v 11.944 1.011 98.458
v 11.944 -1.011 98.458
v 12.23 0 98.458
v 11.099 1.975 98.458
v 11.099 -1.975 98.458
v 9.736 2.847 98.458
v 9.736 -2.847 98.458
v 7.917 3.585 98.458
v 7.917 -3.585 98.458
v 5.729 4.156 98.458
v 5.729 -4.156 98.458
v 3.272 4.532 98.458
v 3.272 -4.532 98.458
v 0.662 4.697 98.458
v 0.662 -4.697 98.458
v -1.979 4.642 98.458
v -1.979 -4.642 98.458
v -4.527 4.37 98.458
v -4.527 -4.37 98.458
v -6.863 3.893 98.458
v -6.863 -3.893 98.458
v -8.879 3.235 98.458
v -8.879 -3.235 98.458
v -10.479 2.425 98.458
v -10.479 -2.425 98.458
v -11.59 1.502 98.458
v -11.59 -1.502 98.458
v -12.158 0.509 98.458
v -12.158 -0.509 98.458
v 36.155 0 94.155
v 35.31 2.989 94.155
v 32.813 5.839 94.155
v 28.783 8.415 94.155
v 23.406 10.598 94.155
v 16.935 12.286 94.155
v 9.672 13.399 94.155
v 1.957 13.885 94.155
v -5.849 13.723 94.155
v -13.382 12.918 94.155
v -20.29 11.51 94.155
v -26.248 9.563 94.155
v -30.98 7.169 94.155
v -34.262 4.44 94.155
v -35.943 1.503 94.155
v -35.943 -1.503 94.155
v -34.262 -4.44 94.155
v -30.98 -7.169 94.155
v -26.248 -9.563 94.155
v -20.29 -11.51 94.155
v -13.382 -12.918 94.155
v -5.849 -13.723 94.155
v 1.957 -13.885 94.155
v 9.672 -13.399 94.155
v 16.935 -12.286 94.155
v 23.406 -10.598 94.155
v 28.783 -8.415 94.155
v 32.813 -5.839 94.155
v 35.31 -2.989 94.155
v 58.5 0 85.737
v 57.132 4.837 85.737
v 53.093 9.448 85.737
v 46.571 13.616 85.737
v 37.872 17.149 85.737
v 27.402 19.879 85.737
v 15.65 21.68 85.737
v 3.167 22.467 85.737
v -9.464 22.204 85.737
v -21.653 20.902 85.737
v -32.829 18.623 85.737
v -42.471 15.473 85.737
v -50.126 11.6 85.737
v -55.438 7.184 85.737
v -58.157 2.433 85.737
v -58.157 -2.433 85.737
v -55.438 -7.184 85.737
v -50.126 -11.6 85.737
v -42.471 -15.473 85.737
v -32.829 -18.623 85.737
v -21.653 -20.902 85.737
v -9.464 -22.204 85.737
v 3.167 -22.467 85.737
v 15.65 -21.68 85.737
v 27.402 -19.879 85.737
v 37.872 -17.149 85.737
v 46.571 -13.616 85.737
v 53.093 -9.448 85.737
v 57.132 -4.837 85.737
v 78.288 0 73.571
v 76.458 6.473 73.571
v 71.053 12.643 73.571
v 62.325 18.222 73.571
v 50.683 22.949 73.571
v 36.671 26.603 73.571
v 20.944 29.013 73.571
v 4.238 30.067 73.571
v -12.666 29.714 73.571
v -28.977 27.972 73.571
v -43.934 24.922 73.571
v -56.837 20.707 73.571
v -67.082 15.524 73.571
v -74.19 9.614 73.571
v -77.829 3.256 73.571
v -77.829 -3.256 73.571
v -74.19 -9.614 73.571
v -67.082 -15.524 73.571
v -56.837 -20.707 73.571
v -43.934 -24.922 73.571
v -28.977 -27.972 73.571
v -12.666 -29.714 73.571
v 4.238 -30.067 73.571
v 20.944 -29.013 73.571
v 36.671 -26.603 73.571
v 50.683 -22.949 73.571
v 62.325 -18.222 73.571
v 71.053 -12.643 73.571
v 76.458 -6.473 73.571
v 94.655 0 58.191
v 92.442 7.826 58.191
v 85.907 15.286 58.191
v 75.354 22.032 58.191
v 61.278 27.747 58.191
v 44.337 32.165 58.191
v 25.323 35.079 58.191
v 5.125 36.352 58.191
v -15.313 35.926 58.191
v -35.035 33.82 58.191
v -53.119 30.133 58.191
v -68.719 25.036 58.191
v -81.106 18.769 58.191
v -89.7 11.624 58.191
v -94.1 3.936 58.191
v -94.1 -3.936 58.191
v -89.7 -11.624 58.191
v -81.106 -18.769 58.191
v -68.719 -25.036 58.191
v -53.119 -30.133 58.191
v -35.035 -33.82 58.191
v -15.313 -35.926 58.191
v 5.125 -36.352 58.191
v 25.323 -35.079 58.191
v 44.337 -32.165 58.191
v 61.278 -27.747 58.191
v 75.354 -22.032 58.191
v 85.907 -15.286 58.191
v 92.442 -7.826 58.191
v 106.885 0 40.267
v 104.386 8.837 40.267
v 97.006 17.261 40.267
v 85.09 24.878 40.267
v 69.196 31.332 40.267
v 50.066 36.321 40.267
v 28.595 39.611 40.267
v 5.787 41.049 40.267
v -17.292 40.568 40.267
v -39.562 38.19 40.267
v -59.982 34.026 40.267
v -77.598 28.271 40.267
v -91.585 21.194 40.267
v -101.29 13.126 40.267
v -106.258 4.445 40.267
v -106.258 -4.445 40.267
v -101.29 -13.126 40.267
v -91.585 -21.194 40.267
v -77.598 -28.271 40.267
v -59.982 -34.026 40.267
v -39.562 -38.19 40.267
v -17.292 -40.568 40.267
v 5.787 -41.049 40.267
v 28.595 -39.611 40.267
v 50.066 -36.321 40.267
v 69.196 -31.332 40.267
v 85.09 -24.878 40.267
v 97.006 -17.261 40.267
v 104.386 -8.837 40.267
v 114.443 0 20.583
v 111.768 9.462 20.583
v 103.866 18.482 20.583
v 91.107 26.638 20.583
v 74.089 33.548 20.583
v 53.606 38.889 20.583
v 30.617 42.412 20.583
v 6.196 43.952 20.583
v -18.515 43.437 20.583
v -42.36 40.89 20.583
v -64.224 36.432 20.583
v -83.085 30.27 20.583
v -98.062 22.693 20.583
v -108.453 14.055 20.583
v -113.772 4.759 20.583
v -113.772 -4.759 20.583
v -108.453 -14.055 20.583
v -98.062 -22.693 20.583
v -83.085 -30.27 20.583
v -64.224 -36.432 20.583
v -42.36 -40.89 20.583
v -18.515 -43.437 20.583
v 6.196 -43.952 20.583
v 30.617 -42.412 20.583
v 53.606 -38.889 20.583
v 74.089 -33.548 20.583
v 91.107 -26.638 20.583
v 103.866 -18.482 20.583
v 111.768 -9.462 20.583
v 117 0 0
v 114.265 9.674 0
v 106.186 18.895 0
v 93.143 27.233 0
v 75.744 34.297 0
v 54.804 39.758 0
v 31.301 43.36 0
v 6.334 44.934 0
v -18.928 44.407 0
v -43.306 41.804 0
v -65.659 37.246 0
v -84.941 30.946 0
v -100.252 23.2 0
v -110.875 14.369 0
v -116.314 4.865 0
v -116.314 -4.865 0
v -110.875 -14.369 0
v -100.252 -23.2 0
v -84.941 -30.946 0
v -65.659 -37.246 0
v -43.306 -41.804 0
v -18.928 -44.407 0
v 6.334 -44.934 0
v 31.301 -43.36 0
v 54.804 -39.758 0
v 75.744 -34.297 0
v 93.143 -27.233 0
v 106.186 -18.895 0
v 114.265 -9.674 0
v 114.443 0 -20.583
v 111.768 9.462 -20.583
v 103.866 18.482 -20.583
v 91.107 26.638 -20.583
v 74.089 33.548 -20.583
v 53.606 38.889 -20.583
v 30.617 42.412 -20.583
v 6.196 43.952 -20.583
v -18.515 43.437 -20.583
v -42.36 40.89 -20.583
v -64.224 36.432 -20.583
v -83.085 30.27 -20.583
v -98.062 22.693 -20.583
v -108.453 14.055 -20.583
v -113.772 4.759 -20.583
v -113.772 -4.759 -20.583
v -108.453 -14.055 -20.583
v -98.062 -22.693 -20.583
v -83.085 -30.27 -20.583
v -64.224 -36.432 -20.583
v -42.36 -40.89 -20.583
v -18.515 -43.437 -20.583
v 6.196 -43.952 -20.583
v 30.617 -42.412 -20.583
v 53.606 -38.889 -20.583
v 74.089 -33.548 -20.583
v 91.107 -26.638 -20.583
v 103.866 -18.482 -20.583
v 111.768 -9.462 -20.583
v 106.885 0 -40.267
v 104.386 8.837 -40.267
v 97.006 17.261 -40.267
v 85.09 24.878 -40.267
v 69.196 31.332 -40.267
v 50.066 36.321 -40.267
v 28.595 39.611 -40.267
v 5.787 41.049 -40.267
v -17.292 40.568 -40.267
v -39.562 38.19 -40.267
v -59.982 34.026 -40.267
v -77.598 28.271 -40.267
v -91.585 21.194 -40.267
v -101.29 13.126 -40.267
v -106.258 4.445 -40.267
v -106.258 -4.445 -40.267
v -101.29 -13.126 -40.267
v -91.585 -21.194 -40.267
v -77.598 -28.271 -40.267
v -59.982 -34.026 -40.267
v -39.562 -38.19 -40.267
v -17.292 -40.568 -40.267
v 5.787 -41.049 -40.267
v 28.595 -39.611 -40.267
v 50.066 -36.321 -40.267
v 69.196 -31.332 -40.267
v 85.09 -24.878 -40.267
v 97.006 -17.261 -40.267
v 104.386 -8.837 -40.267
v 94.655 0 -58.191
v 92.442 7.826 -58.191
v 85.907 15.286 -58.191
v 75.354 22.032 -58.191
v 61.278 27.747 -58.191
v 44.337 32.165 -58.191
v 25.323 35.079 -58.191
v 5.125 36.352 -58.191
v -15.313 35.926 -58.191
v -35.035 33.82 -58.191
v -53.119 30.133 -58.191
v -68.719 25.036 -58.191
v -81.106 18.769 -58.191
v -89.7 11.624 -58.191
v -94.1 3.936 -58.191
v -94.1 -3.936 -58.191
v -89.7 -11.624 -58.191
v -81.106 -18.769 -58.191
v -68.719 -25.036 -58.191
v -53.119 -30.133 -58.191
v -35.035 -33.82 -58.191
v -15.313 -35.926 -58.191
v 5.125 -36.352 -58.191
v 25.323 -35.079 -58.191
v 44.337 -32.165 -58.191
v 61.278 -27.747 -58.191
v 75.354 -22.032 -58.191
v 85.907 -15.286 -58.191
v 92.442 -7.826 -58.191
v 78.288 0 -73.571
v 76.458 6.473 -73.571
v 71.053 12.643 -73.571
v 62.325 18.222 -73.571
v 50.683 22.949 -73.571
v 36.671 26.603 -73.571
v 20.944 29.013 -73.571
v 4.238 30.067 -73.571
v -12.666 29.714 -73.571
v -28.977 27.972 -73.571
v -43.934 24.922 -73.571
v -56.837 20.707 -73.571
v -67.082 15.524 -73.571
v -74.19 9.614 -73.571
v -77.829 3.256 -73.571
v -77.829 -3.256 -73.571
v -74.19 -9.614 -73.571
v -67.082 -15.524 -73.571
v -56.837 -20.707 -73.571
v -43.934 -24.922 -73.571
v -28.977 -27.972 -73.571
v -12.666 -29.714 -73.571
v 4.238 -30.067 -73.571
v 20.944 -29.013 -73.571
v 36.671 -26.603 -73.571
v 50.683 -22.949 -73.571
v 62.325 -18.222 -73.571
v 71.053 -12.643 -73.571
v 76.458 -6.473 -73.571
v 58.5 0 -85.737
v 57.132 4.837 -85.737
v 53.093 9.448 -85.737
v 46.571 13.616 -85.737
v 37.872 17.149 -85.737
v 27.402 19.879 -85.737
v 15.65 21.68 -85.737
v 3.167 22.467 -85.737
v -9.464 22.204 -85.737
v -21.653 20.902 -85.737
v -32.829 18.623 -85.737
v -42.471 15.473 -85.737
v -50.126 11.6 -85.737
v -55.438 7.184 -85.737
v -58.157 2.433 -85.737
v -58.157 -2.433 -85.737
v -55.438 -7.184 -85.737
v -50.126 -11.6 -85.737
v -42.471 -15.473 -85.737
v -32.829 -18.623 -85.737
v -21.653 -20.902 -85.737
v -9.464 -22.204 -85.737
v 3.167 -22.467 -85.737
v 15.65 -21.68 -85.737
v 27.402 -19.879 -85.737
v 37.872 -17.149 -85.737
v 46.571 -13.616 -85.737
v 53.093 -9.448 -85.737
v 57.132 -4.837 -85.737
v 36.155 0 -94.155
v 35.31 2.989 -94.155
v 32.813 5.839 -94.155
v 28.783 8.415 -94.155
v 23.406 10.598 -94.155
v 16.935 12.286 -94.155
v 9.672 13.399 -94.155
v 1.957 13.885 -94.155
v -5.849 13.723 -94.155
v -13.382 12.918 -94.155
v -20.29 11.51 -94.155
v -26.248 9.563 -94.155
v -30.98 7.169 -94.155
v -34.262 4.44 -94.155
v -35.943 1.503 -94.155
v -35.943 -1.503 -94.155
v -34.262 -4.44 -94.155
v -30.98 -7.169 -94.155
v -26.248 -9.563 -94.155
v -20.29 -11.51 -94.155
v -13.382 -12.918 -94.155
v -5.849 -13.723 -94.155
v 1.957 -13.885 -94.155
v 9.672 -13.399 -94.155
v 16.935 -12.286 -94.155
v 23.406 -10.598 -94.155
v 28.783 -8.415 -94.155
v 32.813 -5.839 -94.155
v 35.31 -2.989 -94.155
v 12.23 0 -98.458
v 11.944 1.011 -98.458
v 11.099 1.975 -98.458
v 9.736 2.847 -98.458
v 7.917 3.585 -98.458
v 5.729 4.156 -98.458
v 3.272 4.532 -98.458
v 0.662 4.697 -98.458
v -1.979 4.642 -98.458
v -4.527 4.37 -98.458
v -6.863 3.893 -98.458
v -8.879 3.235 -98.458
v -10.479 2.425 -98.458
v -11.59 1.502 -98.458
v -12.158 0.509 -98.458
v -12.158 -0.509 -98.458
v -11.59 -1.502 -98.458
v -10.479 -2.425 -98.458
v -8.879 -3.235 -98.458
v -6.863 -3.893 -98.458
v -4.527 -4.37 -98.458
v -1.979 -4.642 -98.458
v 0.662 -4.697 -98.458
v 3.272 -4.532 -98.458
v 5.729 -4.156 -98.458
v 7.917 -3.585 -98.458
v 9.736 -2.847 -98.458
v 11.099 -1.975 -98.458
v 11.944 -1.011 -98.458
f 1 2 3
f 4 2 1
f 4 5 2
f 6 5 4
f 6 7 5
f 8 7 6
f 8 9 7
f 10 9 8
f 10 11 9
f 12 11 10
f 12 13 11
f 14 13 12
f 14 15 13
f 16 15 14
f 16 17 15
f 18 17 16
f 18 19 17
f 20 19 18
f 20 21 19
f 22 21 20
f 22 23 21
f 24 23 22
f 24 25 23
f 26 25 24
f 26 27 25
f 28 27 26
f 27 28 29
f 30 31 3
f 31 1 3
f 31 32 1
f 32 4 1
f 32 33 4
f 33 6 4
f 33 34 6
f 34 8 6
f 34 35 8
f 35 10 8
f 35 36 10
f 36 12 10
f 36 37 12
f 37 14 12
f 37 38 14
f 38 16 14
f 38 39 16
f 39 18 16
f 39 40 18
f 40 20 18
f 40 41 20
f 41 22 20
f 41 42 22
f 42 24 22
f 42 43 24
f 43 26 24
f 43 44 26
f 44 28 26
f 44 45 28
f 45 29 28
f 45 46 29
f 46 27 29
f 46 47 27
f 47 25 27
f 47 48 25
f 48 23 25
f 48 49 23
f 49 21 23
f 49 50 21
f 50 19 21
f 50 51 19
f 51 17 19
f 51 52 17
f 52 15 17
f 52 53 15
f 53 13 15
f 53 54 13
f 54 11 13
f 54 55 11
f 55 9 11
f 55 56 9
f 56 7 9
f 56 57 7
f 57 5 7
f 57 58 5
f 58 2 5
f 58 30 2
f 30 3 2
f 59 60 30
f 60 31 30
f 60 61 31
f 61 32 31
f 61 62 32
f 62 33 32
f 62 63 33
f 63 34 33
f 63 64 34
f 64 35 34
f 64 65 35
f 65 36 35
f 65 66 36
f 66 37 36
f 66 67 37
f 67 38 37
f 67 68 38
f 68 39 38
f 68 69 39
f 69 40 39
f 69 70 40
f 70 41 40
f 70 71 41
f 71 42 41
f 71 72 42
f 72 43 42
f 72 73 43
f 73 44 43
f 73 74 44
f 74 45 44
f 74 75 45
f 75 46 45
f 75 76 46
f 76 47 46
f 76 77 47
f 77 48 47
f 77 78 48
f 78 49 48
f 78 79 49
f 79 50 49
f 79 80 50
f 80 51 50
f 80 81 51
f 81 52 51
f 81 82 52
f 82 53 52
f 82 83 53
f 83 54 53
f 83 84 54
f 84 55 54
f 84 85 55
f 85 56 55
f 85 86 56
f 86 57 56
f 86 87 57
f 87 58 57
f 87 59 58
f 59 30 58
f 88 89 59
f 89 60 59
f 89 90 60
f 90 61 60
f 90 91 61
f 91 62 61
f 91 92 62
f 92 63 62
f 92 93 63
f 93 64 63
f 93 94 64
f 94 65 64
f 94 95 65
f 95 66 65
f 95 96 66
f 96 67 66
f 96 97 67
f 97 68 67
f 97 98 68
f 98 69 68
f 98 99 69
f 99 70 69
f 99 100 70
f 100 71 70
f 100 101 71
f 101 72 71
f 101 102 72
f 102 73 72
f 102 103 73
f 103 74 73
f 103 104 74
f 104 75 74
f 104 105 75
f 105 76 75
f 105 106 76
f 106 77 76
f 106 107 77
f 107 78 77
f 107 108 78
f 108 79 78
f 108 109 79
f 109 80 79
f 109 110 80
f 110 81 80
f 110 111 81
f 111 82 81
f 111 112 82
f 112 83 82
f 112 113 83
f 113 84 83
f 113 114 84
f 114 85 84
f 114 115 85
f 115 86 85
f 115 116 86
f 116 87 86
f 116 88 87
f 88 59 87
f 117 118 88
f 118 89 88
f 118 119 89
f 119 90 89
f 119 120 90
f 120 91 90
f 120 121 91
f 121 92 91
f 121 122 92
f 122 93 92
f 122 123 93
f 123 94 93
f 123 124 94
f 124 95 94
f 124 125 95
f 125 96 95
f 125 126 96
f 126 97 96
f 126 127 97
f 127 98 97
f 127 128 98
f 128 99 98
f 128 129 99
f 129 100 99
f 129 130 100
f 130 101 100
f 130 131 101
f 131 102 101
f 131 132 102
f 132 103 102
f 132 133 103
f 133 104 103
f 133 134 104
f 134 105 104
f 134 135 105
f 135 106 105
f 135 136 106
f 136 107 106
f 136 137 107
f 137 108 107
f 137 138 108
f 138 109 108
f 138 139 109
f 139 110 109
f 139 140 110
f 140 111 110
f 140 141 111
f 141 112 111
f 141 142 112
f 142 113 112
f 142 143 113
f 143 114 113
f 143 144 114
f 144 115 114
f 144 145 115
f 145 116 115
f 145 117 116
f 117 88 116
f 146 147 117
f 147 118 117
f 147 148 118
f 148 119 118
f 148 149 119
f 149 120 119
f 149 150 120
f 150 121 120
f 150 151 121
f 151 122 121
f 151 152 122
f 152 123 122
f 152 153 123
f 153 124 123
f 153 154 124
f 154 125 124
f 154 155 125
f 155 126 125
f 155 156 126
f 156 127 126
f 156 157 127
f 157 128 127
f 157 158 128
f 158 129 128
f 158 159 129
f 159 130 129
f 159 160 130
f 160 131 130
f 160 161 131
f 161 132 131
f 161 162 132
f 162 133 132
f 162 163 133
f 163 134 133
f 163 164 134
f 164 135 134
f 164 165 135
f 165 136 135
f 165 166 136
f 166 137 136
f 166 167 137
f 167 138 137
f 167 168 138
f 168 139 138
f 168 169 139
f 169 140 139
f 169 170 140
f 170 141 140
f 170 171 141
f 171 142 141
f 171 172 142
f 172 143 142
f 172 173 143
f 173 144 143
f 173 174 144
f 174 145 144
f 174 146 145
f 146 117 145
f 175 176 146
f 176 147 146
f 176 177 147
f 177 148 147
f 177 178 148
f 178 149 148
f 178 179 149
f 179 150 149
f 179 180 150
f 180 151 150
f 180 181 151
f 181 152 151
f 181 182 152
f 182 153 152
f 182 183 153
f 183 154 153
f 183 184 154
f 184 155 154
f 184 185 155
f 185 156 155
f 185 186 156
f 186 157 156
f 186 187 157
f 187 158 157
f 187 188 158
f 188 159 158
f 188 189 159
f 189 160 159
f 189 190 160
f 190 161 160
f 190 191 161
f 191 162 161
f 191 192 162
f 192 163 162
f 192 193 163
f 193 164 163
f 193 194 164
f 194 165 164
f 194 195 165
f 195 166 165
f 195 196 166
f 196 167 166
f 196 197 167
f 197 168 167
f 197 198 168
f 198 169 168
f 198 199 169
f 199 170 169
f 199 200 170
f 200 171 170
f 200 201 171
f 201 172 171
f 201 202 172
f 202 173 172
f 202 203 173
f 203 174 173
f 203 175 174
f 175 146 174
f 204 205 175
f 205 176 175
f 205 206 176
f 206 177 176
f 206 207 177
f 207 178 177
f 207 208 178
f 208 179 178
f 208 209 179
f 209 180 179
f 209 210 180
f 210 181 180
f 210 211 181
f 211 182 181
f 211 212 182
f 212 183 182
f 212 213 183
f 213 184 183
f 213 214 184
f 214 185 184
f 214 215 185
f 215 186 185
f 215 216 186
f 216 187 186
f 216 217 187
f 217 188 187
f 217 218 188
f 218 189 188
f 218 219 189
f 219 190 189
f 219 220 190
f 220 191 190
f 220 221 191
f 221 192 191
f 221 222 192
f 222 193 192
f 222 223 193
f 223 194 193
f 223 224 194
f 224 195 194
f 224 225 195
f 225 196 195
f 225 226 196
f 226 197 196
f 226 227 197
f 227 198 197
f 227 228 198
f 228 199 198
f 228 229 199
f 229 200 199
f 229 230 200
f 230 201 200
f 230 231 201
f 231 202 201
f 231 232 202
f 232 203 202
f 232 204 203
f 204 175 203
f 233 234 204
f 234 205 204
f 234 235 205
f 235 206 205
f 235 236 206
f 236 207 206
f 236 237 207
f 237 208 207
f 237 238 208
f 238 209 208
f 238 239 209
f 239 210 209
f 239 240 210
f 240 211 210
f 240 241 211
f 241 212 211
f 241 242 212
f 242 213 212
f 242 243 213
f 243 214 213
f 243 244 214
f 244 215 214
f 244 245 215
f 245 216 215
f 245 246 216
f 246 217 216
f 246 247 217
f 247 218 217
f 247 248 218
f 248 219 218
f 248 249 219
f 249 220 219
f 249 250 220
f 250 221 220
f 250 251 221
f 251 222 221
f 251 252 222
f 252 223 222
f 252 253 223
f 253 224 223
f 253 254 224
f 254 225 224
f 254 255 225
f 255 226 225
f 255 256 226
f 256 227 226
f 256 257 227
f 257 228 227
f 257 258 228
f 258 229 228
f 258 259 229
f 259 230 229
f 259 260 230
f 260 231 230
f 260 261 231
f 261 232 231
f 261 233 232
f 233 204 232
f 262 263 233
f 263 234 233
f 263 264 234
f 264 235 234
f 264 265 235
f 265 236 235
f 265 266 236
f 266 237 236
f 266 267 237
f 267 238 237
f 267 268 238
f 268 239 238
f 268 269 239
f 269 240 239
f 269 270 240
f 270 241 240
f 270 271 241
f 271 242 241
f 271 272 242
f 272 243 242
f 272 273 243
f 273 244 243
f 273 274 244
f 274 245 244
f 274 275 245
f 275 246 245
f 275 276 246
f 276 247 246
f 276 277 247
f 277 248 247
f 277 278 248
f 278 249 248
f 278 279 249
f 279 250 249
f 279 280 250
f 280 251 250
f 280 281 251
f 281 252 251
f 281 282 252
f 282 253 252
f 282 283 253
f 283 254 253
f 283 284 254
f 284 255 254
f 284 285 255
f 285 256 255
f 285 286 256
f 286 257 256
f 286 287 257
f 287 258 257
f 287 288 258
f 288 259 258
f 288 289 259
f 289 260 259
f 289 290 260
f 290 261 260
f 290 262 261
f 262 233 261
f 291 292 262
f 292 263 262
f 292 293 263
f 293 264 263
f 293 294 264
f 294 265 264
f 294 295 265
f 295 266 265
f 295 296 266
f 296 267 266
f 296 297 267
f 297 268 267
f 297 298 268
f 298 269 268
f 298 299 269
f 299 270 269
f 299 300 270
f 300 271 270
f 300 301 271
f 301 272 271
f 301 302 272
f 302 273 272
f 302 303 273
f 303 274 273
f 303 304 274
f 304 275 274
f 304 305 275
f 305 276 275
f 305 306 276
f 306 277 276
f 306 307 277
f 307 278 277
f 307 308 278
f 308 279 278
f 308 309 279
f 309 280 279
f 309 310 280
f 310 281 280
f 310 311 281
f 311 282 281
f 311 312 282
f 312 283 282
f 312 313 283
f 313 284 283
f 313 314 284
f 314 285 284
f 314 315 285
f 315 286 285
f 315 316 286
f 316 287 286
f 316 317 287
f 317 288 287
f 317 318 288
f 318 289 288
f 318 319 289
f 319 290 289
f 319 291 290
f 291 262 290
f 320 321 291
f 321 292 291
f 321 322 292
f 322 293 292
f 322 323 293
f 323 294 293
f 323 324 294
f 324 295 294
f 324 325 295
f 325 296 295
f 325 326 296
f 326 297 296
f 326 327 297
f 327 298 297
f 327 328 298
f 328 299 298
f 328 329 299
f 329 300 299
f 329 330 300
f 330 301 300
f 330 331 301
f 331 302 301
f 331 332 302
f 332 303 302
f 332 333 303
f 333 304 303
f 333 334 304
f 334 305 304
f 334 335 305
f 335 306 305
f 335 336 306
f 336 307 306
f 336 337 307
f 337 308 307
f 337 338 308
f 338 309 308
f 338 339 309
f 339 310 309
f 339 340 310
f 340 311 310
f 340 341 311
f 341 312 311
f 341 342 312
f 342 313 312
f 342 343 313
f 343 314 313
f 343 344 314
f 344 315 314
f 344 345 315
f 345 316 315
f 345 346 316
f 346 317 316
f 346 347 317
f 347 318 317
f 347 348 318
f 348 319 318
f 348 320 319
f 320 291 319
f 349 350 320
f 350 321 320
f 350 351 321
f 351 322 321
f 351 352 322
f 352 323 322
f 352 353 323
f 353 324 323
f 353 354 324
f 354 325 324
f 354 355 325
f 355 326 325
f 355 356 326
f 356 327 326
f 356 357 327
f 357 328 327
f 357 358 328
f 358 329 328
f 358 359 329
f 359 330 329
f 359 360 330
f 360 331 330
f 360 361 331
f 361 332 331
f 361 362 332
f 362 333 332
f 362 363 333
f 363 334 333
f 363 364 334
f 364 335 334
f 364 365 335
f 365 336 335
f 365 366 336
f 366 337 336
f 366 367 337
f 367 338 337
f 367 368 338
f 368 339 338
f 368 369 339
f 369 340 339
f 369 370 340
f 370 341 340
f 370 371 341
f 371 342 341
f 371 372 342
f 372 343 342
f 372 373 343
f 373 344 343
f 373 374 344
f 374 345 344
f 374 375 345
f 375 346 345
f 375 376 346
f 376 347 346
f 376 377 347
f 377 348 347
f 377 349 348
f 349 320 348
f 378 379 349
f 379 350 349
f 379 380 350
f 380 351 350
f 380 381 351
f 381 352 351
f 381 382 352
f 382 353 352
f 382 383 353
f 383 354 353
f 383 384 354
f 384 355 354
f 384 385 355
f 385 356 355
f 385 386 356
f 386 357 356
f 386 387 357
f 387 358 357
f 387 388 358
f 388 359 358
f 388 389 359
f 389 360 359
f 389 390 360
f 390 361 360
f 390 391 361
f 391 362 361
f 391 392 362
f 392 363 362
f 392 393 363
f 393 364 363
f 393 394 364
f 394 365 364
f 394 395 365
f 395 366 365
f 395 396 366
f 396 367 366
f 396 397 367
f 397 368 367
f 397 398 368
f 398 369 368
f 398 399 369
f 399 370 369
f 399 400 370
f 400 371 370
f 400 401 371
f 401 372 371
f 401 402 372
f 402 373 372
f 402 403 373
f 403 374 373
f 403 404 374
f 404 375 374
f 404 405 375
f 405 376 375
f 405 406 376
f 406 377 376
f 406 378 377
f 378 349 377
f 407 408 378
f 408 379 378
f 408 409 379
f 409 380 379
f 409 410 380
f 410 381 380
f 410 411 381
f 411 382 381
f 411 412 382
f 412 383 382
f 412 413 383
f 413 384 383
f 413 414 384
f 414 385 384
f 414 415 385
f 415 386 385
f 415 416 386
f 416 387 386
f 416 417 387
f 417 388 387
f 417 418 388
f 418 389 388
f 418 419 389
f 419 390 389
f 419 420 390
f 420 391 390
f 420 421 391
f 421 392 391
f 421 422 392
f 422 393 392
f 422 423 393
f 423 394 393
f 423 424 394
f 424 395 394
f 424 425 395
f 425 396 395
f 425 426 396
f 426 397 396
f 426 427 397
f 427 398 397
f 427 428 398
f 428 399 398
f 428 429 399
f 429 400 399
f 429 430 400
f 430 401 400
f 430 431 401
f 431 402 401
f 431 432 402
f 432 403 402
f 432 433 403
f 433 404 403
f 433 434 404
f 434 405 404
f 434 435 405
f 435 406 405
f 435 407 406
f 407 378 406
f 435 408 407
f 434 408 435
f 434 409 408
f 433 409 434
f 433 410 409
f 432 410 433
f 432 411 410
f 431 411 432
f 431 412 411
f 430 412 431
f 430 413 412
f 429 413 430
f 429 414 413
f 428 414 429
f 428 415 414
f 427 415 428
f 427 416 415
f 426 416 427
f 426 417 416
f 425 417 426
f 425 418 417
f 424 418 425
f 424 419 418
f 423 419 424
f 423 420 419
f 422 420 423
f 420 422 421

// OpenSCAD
// Generated by SolidPython 1.0.1 on 2020-07-29 00:46:50


scale(v = [13, 5, 11]) {
	sphere(r = 9);
}
/***********************************************
*********      SolidPython code:      **********
************************************************
 
# import packages: SolidPython
from solid import *
from solid.utils import *
from itertools import chain, combinations, permutations


class Resize:

    def __init__(self, scad_file):
        self.scad_file = scad_file
        #self.scad_file = import_scad(scad_file)
        # cone/cylinder param:
        self.r1 = 0
        self.r2 = 0
        self.h = 0
        # rectangular prism param:
        self.w = 0
        self.l = 0
        # ellipse param:
        self.r = 0

    # import OpenScad code (file name corresponds to shape)


    # classify shape + parameters
    def assign(self, param1, param2, param3):
        if self.scad_file == 'cone.scad':
            self.r1 = param1
            self.r2 = param2
            self.h = param3
        elif self.scad_file == 'cylinder.scad':
            self.r1 = param1
            self.r2 = param2
            self.h = param3
        elif self.scad_file == 'rectangularPrism.scad':
            self.h = param1
            self.l = param2
            self.w = param3
        else:
            self.r = param1
            self.h = param2

    # resize parameters
    def iterate(self):
        x = range(3, 20, 2)
        i = 1
        if self.scad_file == 'cone.scad':
            tempList = list(permutations(x, 2))
            for temp in tempList:
                param1 = temp[0]
                param2 = temp[1]
                filepath = 'produced_scad_files/' + 'cone' + str(param1) + '_' + str(param2) + '_' + '.scad'
                scad_render_to_file(cylinder(h=param1, r1=param2, r2=0), filepath)

        elif self.scad_file == 'cylinder.scad':
            tempList = list(permutations(x, 3))
            for temp in tempList:
                param1 = temp[0]
                param2 = temp[1]
                filepath = 'produced_scad_files/' + 'cylinder' + str(param1) + '_' + str(param2) + '_' + '.scad'
                scad_render_to_file(cylinder(h=param1, r1=param2, r2=param2), filepath)

        elif self.scad_file == 'rectangularPrism.scad':
            tempList = list(permutations(x, 3))
            for temp in tempList:
                param1 = temp[0]
                param2 = temp[1]
                param3 = temp[2]
                filepath = 'produced_scad_files/' + 'rectangularPrism' + str(param1) + '_' + str(param2) + '_' + str(
                    param3) + '.scad'
                scad_render_to_file(cube(size=(param1, param2, param3)), filepath)

        elif self.scad_file == 'ellipse.scad':
            tempList = list(permutations(x, 4))
            for temp in tempList:
                param1 = temp[0]
                param2 = temp[1]
                param3 = temp[2]
                param4 = temp[3]
                filepath = 'produced_scad_files/' + 'ellipse' + str(param1) + '_' + str(param2) + '_' + str(param3) + '_' + str(param4) + '.scad'
                scad_render_to_file(scale([param1, param2, param3])(sphere(r=param4)), filepath)

    def render_to_scadfile(self):
        scad_render_to_file(scad, 'example.scad') 
 
************************************************/
